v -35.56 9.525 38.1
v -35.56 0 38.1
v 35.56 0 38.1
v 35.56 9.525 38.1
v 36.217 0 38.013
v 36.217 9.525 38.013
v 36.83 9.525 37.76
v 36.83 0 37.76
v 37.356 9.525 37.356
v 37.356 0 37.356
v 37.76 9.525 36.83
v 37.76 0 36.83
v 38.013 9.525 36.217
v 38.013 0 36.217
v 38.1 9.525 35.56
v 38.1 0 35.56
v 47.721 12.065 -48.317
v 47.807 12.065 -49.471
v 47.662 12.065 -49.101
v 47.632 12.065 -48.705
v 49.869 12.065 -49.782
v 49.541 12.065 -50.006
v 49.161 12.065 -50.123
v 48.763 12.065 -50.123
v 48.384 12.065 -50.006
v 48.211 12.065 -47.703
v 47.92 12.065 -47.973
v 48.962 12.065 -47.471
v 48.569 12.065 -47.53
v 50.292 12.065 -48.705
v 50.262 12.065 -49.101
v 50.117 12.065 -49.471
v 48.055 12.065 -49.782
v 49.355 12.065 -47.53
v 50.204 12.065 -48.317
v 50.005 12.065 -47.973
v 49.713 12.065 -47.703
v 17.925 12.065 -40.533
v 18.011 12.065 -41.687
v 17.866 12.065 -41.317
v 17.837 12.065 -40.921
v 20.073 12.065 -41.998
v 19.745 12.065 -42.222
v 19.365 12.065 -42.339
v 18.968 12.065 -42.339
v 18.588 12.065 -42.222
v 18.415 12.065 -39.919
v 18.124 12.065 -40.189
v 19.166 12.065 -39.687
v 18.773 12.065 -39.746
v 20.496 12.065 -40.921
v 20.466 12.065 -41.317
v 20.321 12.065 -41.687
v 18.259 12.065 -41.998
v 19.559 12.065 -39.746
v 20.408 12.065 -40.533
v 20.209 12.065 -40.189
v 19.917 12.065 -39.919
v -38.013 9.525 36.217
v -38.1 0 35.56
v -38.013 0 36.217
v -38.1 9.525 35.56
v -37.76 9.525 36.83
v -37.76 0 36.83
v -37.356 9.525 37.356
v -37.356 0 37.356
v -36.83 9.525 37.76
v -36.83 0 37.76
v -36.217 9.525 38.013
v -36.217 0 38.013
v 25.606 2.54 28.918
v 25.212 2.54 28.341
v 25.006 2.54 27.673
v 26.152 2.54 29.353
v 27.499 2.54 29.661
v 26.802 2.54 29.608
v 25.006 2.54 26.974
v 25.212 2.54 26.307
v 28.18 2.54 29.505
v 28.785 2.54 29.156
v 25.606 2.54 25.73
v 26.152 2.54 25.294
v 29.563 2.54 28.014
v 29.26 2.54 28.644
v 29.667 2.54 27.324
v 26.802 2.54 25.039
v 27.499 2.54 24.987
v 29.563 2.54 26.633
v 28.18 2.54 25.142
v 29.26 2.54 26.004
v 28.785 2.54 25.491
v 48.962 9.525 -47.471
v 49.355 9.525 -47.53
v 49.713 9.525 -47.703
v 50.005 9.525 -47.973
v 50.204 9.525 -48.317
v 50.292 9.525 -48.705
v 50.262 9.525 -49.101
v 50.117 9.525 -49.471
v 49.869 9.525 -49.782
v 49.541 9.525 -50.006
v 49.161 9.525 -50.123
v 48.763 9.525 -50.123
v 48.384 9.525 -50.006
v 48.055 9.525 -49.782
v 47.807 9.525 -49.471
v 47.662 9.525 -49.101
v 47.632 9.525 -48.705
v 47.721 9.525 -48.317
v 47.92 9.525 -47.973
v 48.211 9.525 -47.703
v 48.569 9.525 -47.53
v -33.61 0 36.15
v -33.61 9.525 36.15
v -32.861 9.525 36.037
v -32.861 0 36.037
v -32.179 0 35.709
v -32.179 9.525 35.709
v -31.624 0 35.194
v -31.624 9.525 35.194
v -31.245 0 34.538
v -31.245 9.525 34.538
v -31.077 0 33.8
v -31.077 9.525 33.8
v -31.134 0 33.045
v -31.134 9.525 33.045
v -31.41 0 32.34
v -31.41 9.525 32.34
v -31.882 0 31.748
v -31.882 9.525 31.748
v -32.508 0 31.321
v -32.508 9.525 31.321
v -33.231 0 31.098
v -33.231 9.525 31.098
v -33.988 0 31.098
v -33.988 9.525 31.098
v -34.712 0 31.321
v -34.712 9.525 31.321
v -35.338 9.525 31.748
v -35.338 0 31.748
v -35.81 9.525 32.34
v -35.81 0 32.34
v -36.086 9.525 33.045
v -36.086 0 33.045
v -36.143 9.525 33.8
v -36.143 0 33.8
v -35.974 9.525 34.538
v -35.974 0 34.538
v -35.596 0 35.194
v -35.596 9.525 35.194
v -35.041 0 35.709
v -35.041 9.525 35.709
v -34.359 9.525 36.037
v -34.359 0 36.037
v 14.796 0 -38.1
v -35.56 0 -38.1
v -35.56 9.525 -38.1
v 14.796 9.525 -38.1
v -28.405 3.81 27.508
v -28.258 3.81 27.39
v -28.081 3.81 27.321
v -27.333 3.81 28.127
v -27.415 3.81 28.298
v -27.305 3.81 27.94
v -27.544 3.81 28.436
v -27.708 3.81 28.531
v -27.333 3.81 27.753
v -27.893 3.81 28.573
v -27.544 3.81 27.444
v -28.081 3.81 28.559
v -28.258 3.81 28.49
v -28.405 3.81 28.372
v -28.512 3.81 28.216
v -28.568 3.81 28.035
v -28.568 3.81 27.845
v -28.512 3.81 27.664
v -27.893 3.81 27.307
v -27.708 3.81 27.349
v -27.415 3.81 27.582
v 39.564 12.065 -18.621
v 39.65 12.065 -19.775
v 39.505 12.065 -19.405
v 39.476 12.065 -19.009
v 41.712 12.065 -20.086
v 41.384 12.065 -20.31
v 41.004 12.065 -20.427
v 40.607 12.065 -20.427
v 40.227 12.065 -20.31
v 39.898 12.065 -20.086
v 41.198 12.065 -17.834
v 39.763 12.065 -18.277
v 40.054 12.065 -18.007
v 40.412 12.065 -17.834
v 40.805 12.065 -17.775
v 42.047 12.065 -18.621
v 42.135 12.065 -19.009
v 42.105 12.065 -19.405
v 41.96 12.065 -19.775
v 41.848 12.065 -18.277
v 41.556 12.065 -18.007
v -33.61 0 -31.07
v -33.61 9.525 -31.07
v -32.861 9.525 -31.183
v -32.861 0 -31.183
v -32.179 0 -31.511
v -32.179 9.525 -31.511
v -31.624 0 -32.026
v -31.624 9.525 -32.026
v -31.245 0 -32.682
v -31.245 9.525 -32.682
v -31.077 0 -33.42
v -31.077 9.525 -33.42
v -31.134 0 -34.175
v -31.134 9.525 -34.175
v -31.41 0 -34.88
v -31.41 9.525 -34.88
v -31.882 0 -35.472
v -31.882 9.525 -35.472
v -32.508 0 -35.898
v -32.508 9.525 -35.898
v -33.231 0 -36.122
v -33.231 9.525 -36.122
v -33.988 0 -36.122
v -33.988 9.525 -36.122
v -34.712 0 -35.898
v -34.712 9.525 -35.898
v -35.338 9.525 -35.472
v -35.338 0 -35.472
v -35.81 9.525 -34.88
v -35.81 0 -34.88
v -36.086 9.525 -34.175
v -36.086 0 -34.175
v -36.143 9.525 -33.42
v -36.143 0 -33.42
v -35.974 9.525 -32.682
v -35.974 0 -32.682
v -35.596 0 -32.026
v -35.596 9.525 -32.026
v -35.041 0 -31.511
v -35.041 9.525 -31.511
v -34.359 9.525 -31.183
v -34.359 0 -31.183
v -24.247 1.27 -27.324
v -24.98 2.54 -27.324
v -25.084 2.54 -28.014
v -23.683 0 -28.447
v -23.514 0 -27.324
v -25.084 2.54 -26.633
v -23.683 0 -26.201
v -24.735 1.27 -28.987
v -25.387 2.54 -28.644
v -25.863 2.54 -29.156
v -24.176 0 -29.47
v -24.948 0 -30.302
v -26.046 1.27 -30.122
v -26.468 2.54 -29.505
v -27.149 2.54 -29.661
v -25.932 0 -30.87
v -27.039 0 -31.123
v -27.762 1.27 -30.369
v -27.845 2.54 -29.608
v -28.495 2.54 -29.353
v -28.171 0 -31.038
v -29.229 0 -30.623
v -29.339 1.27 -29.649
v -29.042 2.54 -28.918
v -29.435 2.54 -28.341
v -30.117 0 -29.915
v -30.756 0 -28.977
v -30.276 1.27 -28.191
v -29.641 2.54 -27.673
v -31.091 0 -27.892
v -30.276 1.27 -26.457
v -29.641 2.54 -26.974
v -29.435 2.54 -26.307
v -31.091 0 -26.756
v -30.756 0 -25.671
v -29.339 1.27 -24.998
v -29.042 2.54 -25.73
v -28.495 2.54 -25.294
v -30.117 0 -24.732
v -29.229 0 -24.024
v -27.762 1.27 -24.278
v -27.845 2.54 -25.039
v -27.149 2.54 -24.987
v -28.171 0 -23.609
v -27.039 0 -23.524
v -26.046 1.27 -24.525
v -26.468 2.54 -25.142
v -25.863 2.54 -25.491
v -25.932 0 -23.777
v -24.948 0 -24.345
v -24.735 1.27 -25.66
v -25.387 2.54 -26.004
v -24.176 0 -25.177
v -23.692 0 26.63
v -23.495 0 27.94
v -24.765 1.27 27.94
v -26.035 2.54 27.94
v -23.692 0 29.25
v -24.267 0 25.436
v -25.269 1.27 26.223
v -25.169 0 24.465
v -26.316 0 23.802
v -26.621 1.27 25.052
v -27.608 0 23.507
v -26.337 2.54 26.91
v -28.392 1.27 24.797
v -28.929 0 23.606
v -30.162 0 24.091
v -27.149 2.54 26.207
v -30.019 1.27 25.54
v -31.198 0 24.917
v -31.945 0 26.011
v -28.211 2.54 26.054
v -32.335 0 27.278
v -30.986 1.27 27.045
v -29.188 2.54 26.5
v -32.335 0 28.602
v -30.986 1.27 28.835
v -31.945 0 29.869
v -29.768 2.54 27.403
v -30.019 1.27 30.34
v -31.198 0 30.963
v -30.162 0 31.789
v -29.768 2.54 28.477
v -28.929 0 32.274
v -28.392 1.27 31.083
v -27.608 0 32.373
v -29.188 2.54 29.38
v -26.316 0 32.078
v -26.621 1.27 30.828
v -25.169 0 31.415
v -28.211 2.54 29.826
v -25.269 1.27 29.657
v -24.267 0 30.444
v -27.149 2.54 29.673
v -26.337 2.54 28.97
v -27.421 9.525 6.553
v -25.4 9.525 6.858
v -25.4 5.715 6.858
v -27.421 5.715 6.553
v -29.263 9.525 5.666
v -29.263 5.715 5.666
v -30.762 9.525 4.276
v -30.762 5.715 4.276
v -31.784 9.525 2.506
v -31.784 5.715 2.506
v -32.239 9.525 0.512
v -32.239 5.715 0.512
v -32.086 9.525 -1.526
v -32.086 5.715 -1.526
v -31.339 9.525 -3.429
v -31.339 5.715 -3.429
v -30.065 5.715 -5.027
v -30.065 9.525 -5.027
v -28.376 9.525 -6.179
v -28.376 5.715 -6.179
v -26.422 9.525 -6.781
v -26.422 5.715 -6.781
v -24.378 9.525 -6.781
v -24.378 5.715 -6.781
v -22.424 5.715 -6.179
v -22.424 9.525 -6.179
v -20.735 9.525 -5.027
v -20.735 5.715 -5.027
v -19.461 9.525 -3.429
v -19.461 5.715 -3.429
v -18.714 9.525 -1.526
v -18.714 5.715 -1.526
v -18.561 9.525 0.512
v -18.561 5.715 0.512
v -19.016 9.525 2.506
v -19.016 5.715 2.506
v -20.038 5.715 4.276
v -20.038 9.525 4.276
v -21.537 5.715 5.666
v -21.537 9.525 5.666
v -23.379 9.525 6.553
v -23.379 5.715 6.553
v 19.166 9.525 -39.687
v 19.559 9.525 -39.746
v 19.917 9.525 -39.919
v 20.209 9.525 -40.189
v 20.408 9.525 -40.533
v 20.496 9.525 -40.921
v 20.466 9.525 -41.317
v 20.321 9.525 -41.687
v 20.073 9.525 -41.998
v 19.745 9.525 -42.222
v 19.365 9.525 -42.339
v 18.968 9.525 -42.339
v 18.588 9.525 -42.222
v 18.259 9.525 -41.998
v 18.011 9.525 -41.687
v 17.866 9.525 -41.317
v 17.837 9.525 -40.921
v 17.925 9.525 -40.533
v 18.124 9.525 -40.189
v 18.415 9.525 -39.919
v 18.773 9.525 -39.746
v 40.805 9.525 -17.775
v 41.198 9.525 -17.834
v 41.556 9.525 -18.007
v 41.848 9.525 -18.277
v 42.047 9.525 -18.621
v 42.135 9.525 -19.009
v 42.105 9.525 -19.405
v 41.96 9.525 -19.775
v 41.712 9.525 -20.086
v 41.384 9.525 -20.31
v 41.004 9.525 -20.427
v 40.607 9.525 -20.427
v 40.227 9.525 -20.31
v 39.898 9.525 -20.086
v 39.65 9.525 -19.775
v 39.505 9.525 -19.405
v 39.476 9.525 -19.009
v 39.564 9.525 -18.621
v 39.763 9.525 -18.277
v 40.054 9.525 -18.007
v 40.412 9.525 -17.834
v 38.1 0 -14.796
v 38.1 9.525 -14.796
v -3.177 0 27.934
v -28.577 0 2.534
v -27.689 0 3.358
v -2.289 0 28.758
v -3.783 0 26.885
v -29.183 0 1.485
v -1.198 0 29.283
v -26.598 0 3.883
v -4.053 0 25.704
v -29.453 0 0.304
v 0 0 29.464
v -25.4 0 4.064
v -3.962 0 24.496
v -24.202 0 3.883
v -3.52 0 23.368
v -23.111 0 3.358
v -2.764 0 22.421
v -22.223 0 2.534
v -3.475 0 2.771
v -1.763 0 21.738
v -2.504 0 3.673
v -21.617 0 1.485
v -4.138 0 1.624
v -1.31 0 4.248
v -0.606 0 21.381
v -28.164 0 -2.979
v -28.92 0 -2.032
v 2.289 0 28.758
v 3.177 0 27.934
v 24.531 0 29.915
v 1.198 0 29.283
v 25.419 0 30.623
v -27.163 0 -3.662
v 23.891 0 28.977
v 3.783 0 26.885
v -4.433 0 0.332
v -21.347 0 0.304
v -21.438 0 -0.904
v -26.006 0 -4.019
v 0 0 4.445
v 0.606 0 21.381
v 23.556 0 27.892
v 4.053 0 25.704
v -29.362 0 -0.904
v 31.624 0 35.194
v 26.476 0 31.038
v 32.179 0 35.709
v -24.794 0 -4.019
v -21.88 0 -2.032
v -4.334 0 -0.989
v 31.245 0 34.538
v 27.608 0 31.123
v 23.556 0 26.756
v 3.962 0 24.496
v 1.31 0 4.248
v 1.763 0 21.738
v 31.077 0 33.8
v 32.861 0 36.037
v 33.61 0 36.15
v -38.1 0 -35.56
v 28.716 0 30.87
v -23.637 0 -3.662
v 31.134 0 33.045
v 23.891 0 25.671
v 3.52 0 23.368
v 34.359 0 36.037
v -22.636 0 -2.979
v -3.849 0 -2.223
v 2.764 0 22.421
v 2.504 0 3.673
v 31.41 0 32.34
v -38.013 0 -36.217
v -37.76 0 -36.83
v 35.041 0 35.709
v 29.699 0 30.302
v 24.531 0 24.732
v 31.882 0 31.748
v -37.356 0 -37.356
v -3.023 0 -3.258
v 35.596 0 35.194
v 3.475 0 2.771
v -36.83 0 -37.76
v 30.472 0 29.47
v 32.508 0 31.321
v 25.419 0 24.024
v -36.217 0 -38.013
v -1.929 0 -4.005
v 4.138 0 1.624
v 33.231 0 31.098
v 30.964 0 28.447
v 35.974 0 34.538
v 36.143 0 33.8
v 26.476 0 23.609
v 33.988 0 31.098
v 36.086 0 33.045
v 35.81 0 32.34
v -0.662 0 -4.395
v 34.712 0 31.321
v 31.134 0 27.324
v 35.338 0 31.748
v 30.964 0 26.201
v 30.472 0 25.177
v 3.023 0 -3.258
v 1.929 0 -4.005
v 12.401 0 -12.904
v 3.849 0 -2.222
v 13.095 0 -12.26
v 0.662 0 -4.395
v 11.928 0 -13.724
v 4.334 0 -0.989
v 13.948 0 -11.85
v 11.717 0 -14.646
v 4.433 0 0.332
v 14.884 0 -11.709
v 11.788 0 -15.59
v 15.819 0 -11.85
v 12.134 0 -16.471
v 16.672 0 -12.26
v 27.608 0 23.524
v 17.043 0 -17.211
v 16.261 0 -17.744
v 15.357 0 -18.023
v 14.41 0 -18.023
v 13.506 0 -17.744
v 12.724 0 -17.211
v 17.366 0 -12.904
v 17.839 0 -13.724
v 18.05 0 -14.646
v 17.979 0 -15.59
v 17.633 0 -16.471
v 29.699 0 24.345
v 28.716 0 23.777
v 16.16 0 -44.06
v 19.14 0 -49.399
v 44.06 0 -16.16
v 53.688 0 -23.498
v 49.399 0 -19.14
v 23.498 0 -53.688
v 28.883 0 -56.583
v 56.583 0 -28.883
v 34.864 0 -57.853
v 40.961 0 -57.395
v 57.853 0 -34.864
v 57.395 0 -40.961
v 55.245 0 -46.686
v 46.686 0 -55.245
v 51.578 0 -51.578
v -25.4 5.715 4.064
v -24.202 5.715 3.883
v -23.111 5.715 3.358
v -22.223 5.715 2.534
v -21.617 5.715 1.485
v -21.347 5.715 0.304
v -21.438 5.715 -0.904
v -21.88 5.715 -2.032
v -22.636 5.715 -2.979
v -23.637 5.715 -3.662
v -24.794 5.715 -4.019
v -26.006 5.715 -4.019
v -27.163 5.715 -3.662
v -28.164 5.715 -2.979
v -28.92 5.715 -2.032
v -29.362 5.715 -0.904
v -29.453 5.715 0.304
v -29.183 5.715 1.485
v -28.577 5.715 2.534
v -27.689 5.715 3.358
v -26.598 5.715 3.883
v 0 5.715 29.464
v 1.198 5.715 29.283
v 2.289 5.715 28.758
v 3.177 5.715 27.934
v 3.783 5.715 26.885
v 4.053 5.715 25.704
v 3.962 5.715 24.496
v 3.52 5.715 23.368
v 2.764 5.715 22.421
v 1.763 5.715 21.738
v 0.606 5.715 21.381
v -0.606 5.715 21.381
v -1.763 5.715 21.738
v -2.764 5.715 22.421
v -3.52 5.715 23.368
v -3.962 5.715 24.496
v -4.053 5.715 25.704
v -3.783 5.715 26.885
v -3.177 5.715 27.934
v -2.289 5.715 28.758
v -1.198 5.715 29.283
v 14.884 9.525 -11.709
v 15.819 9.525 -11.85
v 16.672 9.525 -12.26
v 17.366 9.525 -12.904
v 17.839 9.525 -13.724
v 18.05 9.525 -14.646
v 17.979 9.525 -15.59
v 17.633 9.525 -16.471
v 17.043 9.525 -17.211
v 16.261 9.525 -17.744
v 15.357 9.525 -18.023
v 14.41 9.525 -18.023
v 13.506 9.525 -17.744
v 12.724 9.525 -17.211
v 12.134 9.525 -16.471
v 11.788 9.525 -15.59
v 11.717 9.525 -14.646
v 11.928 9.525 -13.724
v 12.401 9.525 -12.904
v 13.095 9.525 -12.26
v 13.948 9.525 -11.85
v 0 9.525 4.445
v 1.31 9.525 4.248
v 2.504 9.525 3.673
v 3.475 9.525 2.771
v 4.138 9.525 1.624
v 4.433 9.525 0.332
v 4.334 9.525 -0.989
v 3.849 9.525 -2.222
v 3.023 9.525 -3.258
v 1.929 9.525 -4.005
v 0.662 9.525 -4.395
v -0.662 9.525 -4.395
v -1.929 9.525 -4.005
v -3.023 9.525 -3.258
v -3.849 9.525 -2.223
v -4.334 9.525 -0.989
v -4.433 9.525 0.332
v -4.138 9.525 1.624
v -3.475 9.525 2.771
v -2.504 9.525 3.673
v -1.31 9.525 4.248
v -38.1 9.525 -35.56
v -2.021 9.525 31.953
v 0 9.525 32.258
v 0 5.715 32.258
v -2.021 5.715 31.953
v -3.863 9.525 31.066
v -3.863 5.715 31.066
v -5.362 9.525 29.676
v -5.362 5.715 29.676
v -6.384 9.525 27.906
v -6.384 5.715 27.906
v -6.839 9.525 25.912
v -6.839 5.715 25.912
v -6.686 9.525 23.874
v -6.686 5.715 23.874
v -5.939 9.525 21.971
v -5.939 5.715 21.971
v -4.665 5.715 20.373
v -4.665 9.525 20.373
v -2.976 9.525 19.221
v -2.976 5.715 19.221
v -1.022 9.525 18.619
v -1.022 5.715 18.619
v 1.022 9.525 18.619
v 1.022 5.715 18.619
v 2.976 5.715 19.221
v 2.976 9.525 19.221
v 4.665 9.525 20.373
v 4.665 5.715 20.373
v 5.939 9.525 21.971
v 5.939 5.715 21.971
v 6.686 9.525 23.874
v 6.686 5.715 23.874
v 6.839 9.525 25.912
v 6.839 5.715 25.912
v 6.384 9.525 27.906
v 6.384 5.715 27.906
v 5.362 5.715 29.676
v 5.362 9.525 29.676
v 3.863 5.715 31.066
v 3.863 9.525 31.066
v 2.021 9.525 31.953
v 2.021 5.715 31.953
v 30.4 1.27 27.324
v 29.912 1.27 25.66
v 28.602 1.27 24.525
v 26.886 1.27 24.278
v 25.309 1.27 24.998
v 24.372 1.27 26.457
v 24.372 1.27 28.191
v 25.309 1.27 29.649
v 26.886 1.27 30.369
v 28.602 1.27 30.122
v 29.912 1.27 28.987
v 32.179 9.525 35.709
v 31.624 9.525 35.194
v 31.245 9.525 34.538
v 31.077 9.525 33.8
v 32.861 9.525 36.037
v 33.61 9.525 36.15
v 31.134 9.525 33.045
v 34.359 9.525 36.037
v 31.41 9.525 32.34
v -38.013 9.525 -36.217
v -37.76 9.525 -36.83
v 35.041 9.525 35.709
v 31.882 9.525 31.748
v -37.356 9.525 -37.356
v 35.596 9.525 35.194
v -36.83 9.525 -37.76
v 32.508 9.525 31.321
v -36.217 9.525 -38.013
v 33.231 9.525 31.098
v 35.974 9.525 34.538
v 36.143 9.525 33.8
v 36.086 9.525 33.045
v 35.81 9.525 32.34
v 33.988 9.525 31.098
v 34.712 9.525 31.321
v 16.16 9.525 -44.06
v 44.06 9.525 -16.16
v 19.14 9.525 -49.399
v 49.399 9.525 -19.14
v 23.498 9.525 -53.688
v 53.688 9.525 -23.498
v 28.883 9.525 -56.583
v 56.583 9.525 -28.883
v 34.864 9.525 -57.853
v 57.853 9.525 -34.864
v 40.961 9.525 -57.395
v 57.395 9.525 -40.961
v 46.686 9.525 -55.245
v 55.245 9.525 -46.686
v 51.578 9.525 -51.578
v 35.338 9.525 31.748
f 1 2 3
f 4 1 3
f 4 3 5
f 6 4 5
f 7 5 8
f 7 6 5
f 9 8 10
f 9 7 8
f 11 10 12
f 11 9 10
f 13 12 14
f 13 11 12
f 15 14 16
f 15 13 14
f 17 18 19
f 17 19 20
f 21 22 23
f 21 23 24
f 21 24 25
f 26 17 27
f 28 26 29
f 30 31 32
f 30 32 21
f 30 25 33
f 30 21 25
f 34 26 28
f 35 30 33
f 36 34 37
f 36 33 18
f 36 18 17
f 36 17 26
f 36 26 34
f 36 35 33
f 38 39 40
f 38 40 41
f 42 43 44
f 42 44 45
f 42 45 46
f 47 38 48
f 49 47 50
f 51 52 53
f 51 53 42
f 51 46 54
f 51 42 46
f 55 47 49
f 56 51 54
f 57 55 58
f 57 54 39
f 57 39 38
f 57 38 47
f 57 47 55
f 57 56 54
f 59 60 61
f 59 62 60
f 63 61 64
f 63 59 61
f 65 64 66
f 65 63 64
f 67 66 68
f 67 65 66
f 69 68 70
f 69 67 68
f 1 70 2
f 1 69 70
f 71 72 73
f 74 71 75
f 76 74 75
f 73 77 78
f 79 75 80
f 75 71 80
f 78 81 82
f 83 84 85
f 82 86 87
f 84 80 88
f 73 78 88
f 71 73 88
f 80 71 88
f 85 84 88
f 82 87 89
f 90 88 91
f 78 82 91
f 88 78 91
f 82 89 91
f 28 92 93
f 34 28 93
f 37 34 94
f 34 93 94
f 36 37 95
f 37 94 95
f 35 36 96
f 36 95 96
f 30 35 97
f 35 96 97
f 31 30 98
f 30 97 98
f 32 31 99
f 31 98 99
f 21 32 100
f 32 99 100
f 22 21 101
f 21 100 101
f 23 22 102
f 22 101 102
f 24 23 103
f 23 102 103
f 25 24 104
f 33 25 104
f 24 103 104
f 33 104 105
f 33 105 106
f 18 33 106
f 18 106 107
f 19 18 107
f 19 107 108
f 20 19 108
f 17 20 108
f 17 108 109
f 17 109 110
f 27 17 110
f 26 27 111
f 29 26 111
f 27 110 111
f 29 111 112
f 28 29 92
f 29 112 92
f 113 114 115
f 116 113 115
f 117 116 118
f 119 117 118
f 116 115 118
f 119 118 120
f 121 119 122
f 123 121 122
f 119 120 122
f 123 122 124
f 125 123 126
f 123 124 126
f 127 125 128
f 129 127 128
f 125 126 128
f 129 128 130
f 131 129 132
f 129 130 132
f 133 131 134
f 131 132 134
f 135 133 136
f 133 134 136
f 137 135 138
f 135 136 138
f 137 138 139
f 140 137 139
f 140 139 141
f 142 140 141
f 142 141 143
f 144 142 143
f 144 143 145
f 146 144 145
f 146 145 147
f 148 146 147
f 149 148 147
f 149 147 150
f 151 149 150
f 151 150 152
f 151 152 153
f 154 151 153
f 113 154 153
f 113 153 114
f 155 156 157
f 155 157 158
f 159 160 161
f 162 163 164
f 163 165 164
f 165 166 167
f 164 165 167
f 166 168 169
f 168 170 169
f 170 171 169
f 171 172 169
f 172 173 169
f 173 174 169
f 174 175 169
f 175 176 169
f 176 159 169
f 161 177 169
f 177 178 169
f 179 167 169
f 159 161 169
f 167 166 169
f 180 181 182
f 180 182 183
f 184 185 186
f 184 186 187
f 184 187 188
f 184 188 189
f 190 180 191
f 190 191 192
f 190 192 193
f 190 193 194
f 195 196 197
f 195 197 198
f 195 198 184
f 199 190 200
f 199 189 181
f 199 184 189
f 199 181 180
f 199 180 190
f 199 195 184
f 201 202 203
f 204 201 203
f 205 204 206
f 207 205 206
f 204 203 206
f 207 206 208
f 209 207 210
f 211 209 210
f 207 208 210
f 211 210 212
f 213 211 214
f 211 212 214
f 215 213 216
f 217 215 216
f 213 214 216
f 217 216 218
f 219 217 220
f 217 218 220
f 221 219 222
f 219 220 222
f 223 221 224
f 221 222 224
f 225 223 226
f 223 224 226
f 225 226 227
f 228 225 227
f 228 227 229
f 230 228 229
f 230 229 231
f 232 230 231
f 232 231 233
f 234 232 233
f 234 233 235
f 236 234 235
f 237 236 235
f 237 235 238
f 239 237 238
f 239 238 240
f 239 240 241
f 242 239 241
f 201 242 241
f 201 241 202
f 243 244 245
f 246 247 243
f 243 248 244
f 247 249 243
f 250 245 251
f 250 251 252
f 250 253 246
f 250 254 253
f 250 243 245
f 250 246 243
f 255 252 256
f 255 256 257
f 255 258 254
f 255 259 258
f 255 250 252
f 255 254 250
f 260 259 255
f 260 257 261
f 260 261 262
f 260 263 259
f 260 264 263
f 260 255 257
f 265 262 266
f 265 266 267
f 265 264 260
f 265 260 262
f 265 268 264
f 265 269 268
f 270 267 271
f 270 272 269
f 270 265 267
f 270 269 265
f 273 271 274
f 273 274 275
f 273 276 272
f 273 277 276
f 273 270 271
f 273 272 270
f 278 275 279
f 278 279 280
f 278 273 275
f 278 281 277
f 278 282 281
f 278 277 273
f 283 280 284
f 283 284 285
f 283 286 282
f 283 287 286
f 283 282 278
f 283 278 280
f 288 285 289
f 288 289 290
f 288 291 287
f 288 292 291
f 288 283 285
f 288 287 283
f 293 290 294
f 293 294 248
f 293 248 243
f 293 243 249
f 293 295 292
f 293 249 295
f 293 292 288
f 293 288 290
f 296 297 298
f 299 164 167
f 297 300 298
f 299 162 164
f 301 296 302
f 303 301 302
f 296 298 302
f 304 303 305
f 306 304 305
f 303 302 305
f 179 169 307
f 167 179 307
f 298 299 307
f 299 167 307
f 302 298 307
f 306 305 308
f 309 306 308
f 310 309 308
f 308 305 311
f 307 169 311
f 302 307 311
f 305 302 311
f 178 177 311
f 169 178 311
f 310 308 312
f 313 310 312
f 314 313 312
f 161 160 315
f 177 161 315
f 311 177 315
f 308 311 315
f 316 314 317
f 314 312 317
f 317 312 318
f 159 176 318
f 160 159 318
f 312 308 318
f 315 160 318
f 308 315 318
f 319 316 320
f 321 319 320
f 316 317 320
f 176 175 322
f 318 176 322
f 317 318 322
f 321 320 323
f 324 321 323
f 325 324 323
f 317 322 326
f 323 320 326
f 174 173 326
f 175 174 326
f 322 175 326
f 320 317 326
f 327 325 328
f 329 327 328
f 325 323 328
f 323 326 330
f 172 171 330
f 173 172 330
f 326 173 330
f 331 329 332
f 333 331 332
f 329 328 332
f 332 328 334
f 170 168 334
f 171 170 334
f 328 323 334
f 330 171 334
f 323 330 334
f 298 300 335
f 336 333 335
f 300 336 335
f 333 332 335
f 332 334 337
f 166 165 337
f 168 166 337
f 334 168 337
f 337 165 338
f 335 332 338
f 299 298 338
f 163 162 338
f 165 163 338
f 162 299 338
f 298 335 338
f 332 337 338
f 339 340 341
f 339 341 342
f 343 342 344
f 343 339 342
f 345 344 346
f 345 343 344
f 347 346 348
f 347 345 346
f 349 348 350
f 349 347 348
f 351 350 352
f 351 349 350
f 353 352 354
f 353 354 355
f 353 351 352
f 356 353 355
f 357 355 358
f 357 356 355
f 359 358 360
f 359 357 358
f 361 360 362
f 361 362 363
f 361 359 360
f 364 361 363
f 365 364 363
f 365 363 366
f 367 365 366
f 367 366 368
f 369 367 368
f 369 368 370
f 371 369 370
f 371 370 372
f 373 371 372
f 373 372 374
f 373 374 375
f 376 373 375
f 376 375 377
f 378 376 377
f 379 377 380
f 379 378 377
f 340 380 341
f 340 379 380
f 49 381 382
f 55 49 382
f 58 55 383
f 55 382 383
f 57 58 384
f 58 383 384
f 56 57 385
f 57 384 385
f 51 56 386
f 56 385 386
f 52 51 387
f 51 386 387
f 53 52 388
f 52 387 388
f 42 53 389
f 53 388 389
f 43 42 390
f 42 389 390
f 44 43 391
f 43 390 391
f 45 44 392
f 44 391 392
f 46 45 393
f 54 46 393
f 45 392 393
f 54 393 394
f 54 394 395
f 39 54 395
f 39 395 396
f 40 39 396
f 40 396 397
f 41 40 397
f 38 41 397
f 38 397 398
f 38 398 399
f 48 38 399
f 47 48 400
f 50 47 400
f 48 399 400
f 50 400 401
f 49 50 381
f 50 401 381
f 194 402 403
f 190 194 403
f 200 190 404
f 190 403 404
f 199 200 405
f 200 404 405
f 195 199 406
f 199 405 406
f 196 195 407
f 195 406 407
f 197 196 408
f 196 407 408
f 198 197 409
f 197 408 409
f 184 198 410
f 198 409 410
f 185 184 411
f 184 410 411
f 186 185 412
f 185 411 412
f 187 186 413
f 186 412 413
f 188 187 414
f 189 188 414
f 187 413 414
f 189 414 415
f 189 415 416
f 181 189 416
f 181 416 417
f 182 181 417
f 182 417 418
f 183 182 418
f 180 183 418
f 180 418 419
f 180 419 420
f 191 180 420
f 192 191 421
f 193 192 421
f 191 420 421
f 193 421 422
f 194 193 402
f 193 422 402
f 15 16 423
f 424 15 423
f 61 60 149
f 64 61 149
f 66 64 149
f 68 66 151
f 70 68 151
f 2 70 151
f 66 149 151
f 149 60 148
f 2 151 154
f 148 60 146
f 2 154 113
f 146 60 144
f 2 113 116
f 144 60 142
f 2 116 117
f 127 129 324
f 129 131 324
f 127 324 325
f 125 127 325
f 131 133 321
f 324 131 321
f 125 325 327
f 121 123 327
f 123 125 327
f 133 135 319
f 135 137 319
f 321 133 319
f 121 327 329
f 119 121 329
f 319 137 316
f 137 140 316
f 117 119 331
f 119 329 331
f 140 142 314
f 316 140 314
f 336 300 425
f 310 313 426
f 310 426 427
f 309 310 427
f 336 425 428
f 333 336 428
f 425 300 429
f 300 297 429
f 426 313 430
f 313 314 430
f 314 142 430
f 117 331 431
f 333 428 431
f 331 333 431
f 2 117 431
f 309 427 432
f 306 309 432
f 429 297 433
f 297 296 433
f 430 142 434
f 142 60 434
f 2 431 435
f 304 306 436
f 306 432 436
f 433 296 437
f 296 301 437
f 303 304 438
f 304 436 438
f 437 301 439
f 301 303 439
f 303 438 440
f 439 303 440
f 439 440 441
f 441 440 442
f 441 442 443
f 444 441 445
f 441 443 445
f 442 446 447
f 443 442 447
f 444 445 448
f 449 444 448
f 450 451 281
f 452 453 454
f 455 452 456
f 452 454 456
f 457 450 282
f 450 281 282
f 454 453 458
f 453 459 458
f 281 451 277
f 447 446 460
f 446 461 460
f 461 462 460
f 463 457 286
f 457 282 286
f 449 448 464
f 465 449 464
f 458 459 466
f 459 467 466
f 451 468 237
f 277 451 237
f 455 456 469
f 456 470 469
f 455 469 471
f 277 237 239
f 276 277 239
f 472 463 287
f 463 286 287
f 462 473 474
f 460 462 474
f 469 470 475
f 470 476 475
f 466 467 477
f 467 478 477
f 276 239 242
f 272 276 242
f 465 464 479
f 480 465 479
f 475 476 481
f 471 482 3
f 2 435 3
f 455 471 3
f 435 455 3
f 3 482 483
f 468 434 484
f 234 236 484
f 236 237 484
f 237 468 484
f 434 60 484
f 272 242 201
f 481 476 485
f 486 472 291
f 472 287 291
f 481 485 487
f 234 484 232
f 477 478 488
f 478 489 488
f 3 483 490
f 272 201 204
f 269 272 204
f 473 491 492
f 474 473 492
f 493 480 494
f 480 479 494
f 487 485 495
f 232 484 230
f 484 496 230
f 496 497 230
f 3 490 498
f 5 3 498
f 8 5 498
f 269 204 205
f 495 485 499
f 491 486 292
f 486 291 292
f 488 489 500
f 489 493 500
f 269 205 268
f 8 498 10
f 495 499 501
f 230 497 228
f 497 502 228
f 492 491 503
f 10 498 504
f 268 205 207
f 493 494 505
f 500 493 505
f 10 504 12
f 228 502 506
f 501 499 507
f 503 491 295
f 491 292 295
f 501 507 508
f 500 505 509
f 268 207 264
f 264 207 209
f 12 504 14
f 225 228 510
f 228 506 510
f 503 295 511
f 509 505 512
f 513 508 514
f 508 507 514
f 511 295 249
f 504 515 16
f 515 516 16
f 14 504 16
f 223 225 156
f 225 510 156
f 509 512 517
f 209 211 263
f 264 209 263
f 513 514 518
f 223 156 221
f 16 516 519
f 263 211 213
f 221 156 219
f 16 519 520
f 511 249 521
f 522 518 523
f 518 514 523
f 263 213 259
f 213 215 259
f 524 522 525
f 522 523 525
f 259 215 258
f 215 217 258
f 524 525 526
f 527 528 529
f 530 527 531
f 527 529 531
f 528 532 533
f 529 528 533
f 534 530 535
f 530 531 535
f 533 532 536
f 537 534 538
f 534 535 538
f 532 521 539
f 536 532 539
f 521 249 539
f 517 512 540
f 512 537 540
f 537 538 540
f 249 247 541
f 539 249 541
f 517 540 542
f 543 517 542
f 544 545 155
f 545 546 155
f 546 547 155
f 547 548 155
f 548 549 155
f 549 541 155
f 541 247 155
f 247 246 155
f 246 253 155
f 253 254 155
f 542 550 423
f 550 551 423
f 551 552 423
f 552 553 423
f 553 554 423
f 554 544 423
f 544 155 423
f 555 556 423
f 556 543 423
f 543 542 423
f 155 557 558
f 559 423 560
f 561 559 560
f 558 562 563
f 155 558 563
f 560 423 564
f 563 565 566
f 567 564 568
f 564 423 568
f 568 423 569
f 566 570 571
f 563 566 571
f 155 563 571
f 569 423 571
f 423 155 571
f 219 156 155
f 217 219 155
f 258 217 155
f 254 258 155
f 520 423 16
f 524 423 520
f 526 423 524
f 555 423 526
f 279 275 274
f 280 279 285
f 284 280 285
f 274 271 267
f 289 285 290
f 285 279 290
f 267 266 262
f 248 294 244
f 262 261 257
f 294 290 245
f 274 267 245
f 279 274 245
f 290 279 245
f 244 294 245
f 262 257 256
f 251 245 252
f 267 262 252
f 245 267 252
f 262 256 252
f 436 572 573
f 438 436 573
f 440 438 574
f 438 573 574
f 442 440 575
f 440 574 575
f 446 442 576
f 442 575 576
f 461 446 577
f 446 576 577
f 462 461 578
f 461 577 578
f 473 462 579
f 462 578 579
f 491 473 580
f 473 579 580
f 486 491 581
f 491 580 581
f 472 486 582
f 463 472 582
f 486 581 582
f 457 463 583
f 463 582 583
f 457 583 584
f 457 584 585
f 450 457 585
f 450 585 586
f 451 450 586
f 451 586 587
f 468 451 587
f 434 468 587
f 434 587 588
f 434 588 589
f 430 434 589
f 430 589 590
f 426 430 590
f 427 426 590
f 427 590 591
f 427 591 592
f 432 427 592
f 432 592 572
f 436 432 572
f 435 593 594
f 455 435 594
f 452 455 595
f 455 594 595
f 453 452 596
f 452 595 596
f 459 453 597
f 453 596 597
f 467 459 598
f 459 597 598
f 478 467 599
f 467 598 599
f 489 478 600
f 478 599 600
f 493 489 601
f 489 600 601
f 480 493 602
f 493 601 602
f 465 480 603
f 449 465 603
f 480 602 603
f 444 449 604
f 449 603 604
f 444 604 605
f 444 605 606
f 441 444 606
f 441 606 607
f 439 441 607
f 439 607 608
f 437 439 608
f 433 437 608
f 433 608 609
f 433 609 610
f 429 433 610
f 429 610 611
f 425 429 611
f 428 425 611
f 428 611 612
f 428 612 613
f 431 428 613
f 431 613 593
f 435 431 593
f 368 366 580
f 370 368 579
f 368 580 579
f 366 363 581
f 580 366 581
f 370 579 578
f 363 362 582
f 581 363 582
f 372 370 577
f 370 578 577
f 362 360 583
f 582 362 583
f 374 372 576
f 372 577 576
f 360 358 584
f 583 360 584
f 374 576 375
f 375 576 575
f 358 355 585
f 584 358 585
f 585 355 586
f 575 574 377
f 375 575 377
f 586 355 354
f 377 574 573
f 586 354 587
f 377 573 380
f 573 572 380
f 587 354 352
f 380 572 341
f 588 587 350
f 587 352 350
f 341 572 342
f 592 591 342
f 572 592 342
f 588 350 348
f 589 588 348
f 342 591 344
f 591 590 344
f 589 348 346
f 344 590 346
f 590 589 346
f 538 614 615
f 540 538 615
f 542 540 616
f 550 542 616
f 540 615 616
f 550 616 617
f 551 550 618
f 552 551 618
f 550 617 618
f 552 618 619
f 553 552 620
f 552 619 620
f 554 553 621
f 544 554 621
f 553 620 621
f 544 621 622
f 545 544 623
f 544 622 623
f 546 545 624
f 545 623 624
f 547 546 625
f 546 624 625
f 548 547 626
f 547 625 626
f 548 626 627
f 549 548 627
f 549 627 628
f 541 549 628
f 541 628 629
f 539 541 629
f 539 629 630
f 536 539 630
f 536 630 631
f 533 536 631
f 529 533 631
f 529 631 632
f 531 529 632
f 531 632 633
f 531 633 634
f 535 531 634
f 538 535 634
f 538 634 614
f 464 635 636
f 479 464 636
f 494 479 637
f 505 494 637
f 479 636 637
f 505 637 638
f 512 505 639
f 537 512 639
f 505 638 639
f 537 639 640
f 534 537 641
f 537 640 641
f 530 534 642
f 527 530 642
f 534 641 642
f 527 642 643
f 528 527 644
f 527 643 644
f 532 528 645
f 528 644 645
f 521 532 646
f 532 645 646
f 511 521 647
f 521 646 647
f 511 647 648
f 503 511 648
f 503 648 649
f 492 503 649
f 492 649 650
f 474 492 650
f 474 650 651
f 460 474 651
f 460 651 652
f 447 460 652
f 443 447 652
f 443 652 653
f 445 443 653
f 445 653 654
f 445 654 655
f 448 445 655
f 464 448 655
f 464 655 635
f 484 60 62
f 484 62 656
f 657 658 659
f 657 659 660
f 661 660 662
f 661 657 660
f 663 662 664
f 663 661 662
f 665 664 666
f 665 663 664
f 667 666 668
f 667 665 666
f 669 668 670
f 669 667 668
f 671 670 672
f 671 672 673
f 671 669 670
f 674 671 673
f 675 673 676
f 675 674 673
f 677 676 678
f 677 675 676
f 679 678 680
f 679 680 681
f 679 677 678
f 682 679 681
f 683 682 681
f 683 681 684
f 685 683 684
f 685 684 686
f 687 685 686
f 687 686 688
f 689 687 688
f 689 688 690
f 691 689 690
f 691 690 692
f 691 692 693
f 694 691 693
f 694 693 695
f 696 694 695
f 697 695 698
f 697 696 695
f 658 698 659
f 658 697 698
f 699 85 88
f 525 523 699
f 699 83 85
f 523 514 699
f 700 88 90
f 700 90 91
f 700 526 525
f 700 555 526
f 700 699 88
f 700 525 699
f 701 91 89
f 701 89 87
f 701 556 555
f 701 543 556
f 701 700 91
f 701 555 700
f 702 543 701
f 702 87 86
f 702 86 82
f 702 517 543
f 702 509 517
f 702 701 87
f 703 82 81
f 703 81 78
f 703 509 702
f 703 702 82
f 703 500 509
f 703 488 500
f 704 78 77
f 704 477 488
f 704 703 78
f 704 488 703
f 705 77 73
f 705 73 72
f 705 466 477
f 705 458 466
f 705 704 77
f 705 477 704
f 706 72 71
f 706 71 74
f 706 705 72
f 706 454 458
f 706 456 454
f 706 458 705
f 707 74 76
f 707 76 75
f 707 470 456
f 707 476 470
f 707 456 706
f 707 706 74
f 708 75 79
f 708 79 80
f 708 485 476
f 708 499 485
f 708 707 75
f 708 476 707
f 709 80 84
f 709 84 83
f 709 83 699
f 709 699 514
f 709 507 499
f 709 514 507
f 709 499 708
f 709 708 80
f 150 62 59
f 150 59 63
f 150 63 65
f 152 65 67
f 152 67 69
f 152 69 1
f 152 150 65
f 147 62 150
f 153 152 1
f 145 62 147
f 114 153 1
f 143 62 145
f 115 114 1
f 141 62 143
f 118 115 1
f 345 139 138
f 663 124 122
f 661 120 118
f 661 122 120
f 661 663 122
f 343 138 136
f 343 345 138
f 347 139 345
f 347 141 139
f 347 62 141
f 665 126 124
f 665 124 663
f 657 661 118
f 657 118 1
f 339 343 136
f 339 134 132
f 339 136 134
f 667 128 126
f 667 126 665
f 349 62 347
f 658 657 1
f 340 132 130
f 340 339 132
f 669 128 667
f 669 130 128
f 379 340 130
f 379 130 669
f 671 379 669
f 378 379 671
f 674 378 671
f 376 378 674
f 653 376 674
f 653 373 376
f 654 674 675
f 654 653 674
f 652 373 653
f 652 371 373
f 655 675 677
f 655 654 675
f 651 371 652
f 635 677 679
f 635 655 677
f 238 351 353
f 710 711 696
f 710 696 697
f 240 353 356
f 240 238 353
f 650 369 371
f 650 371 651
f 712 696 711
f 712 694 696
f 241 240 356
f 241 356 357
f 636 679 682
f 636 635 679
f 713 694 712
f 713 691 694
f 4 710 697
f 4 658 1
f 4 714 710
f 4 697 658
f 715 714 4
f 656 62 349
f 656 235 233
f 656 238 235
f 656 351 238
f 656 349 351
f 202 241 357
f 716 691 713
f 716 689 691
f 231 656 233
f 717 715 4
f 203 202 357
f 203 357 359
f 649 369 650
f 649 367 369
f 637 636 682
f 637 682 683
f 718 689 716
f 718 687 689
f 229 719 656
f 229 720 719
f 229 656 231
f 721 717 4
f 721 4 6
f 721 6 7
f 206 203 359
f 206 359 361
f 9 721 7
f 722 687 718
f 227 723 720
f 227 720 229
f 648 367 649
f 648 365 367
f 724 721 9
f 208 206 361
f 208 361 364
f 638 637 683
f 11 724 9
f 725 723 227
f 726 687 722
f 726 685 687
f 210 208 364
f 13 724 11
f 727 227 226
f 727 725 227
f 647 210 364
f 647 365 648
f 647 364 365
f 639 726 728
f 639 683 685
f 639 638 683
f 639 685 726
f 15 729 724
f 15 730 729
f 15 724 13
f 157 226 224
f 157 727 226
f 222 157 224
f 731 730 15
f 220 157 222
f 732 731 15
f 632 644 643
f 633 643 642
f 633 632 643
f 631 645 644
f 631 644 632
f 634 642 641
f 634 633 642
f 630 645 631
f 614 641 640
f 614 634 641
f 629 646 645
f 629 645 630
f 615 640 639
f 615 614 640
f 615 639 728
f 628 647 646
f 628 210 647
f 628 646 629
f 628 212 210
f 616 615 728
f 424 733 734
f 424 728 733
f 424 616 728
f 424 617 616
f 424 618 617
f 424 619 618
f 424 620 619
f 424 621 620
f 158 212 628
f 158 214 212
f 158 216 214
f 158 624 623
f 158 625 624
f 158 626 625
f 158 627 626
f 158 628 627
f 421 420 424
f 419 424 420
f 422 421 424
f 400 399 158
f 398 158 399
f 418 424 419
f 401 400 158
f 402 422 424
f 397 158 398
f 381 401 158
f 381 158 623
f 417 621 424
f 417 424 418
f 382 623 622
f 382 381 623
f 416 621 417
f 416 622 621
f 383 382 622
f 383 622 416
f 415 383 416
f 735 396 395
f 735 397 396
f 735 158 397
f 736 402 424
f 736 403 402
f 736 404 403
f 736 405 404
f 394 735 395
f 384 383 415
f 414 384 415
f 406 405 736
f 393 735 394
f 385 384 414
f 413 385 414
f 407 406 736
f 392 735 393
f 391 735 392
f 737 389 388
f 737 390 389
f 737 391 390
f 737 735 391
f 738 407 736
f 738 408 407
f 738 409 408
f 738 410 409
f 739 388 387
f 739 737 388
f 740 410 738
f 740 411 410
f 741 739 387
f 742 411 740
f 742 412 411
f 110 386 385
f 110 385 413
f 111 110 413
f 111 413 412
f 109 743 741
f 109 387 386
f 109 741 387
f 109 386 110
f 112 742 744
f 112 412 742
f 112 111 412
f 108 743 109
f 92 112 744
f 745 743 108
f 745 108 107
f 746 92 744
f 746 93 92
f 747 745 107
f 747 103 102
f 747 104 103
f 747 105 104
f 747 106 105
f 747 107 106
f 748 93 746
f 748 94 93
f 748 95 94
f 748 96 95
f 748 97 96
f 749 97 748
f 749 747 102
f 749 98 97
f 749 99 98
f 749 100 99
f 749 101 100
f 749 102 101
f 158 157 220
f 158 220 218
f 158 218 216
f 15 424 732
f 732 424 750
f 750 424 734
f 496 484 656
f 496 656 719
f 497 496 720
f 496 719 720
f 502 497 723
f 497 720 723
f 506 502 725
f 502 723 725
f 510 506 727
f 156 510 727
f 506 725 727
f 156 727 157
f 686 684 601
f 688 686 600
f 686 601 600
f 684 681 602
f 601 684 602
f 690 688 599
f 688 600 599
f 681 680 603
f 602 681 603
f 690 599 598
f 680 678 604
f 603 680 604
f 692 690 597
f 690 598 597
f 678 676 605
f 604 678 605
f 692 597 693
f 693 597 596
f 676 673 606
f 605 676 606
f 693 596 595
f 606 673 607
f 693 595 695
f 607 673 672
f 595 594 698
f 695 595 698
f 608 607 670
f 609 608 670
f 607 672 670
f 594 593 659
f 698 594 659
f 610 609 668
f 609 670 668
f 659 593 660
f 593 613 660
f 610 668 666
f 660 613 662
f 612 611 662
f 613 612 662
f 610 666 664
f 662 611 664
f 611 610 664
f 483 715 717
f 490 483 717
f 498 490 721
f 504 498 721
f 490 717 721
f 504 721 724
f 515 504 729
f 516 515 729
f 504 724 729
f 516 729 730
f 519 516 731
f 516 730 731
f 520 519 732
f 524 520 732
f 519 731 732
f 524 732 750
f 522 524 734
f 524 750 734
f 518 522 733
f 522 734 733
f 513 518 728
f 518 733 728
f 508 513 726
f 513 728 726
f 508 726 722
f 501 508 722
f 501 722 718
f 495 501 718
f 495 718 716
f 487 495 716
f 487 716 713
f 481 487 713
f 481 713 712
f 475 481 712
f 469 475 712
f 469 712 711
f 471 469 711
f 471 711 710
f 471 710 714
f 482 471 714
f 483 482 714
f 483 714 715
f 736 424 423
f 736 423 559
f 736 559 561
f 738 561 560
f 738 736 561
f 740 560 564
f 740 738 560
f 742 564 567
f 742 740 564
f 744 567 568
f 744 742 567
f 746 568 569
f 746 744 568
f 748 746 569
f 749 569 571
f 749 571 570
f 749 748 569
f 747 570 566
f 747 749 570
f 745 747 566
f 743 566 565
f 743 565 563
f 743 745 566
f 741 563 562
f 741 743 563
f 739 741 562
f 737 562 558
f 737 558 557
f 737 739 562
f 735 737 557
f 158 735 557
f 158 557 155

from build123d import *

# Parameters (mm, degrees)
SKETCH1_W                    = 76.2
SKETCH1_H                    = 76.2
BOSS_EXTRUDE1_DEPTH          = 9.525
SKETCH6_R                    = 3.81
CUT_EXTRUDE2_DEPTH           = 2.54
CUT_EXTRUDE2_DRAFT           = 30
CUT_EXTRUDE2_PROFILE_2_DEPTH = 2.54
CUT_EXTRUDE2_PROFILE_2_DRAFT = 30
CUT_EXTRUDE4_REACH           = 56.717
SKETCH12_R                   = 4.064
SKETCH13_R                   = 6.858
CUT_EXTRUDE7_DEPTH           = 3.81
SKETCH7_R                    = 4.445
CUT_EXTRUDE8_DEPTH           = 3.81
CUT_EXTRUDE8_TAPER           = 45
CUT_EXTRUDE9_REACH           = 56.717
SKETCH15_R                   = 4.445
FILLET1_R                    = 2.54
SKETCH17_R                   = 21.59
BOSS_EXTRUDE2_DEPTH          = 9.525
SKETCH18_R                   = 1.3335
BOSS_EXTRUDE3_DEPTH          = 2.54
CUT_EXTRUDE10_REACH          = 84.437
SKETCH20_R                   = 2.54
SKETCH20_R_2                 = 3.175


with BuildPart() as part:
    # Sketch1 → Boss-Extrude1 (new body)
    with BuildSketch(Plane(origin=(0, 0, 0), x_dir=(1, 0, 0), z_dir=(0, 1, 0))):
        Rectangle(SKETCH1_W, SKETCH1_H)
    extrude(amount=BOSS_EXTRUDE1_DEPTH)


with BuildPart() as cut_extrude2_tool:
    # Sketch6 → Cut-Extrude2 (with draft: the straight prism first)
    with BuildSketch(Plane(origin=(0, 0, 0), x_dir=(1, 0, 0), z_dir=(0, 1, 0))):
        with Locations((-27.323692655, 27.323692655)):
            Circle(SKETCH6_R)
    extrude(amount=CUT_EXTRUDE2_DEPTH)
    # Cut-Extrude2: the draft: its side faces are tilted about the plane it starts from
    cut_extrude2_sides = [cut_extrude2_tool.faces().sort_by_distance(p)[0] for p in [
        (-31.133692655, 1.27, -27.323692655),
    ]]
    draft(cut_extrude2_sides, Plane(origin=(0, 0, 0), x_dir=(1, 0, 0), z_dir=(0, 1, 0)), CUT_EXTRUDE2_DRAFT)


with BuildPart() as part_1:
    add(part.part)

    # Cut-Extrude2: cut by cut_extrude2_tool
    add(cut_extrude2_tool.part, mode=Mode.SUBTRACT)


with BuildPart() as cut_extrude2_profile_2_tool:
    # Sketch6 → Cut-Extrude2 profile 2 (with draft: the straight prism first)
    with BuildSketch(Plane(origin=(0, 0, 0), x_dir=(1, 0, 0), z_dir=(0, 1, 0))):
        with Locations((27.323692655, -27.323692655)):
            Circle(SKETCH6_R)
    extrude(amount=CUT_EXTRUDE2_PROFILE_2_DEPTH)
    # Cut-Extrude2 profile 2: the draft: its side faces are tilted about the plane it starts from
    cut_extrude2_profile_2_sides = [cut_extrude2_profile_2_tool.faces().sort_by_distance(p)[0] for p in [
        (23.513692655, 1.27, 27.323692655),
    ]]
    draft(cut_extrude2_profile_2_sides, Plane(origin=(0, 0, 0), x_dir=(1, 0, 0), z_dir=(0, 1, 0)), CUT_EXTRUDE2_PROFILE_2_DRAFT)


with BuildPart() as part_2:
    add(part_1.part)

    # Cut-Extrude2 profile 2: cut by cut_extrude2_profile_2_tool
    add(cut_extrude2_profile_2_tool.part, mode=Mode.SUBTRACT)

    # Sketch12 → Cut-Extrude4 (cut, up to next)
    with BuildSketch(Plane(origin=(0, 9.525, 0), x_dir=(1, 0, 0), z_dir=(0, 1, 0)), mode=Mode.PRIVATE) as cut_extrude4_sk1:
        with Locations(Location((-25.4, 0, 0), (0, 0, 270))):
            Circle(SKETCH12_R)
    cut_extrude4_tool1 = extrude(cut_extrude4_sk1.sketch, amount=-CUT_EXTRUDE4_REACH, mode=Mode.PRIVATE) & part_2.part
    # Sketch12 → Cut-Extrude4 (cut, up to next)
    with BuildSketch(Plane(origin=(0, 9.525, 0), x_dir=(1, 0, 0), z_dir=(0, 1, 0)), mode=Mode.PRIVATE) as cut_extrude4_sk2:
        with Locations(Location((0, -25.4, 0), (0, 0, 270))):
            Circle(SKETCH12_R)
    cut_extrude4_tool2 = extrude(cut_extrude4_sk2.sketch, amount=-CUT_EXTRUDE4_REACH, mode=Mode.PRIVATE) & part_2.part
    add(cut_extrude4_tool1.solids().sort_by_distance((-25.4, 9.525, 0))[0], mode=Mode.SUBTRACT)
    add(cut_extrude4_tool2.solids().sort_by_distance((0, 9.525, 25.4))[0], mode=Mode.SUBTRACT)

    # Sketch13 → Cut-Extrude7 (cut)
    with BuildSketch(Plane.XZ.offset(-9.525)):
        with Locations(Location((-25.4, 0, 0), (0, 0, 90))):
            Circle(SKETCH13_R)
        with Locations(Location((0, 25.4, 0), (0, 0, 90))):
            Circle(SKETCH13_R)
    extrude(amount=CUT_EXTRUDE7_DEPTH, mode=Mode.SUBTRACT)

    # Sketch7 → Cut-Extrude8 (cut)
    with BuildSketch(Plane(origin=(0, 0, 0), x_dir=(1, 0, 0), z_dir=(0, 1, 0))):
        with Locations((-27.94, -27.94)):
            Circle(SKETCH7_R)
    extrude(amount=CUT_EXTRUDE8_DEPTH, taper=CUT_EXTRUDE8_TAPER, mode=Mode.SUBTRACT)

    # Sketch15 → Cut-Extrude9 (cut, up to next)
    with BuildSketch(Plane(origin=(0, 9.525, 0), x_dir=(1, 0, 0), z_dir=(0, 1, 0)), mode=Mode.PRIVATE) as cut_extrude9_sk1:
        with Locations(Location((0, 0, 0), (0, 0, 270))):
            Circle(SKETCH15_R)
    cut_extrude9_tool1 = extrude(cut_extrude9_sk1.sketch, amount=-CUT_EXTRUDE9_REACH, mode=Mode.PRIVATE) & part_2.part
    add(cut_extrude9_tool1.solids().sort_by_distance((0, 9.525, 0))[0], mode=Mode.SUBTRACT)

    # Fillet1
    fillet1_edges = [part_2.edges().sort_by_distance(p)[0] for p in [
        (38.1, 4.7625, 38.1),
        (-38.1, 4.7625, 38.1),
        (-38.1, 4.7625, -38.1),
        (38.1, 4.7625, -38.1),
    ]]
    fillet(fillet1_edges, radius=FILLET1_R)

    # Sketch17 → Boss-Extrude2 (add)
    with BuildSketch(Plane(origin=(0, 9.525, 0), x_dir=(1, 0, 0), z_dir=(0, 1, 0))):
        with Locations((36.311274722, 36.311274722)):
            Circle(SKETCH17_R)
    extrude(amount=-BOSS_EXTRUDE2_DEPTH)

    # Sketch18 → Boss-Extrude3 (add)
    with BuildSketch(Plane(origin=(0, 9.525, 0), x_dir=(1, 0, 0), z_dir=(0, 1, 0))):
        with Locations(Location((19.166305808, 41.020673934, 0), (0, 0, 270))):
            Circle(SKETCH18_R)
        with Locations(Location((48.962218533, 48.804553742, 0), (0, 0, 270))):
            Circle(SKETCH18_R)
        with Locations(Location((40.805299824, 19.108596489, 0), (0, 0, 270))):
            Circle(SKETCH18_R)
    extrude(amount=BOSS_EXTRUDE3_DEPTH)

    # Sketch20 → Cut-Extrude10 (cut, up to next)
    with BuildSketch(Plane(origin=(0, 9.525, 0), x_dir=(1, 0, 0), z_dir=(0, 1, 0)), mode=Mode.PRIVATE) as cut_extrude10_sk1:
        with Locations(Location((-33.609871939, -33.609871939, 0), (0, 0, 270))):
            Circle(SKETCH20_R)
    cut_extrude10_tool1 = extrude(cut_extrude10_sk1.sketch, amount=-CUT_EXTRUDE10_REACH, mode=Mode.PRIVATE) & part_2.part
    # Sketch20 → Cut-Extrude10 (cut, up to next)
    with BuildSketch(Plane(origin=(0, 9.525, 0), x_dir=(1, 0, 0), z_dir=(0, 1, 0)), mode=Mode.PRIVATE) as cut_extrude10_sk2:
        with Locations(Location((33.609871939, -33.609871939, 0), (0, 0, 270))):
            Circle(SKETCH20_R)
    cut_extrude10_tool2 = extrude(cut_extrude10_sk2.sketch, amount=-CUT_EXTRUDE10_REACH, mode=Mode.PRIVATE) & part_2.part
    # Sketch20 → Cut-Extrude10 (cut, up to next)
    with BuildSketch(Plane(origin=(0, 9.525, 0), x_dir=(1, 0, 0), z_dir=(0, 1, 0)), mode=Mode.PRIVATE) as cut_extrude10_sk3:
        with Locations(Location((-33.609871939, 33.609871939, 0), (0, 0, 270))):
            Circle(SKETCH20_R)
    cut_extrude10_tool3 = extrude(cut_extrude10_sk3.sketch, amount=-CUT_EXTRUDE10_REACH, mode=Mode.PRIVATE) & part_2.part
    # Sketch20 → Cut-Extrude10 (cut, up to next)
    with BuildSketch(Plane(origin=(0, 9.525, 0), x_dir=(1, 0, 0), z_dir=(0, 1, 0)), mode=Mode.PRIVATE) as cut_extrude10_sk4:
        with Locations(Location((14.883511114, 14.883511114, 0), (0, 0, 270))):
            Circle(SKETCH20_R_2)
    cut_extrude10_tool4 = extrude(cut_extrude10_sk4.sketch, amount=-CUT_EXTRUDE10_REACH, mode=Mode.PRIVATE) & part_2.part
    add(cut_extrude10_tool1.solids().sort_by_distance((-33.609872, 9.525, 33.609872))[0], mode=Mode.SUBTRACT)
    add(cut_extrude10_tool2.solids().sort_by_distance((33.609872, 9.525, 33.609872))[0], mode=Mode.SUBTRACT)
    add(cut_extrude10_tool3.solids().sort_by_distance((-33.609872, 9.525, -33.609872))[0], mode=Mode.SUBTRACT)
    add(cut_extrude10_tool4.solids().sort_by_distance((14.883511, 9.525, -14.883511))[0], mode=Mode.SUBTRACT)


solid = part_2.part
